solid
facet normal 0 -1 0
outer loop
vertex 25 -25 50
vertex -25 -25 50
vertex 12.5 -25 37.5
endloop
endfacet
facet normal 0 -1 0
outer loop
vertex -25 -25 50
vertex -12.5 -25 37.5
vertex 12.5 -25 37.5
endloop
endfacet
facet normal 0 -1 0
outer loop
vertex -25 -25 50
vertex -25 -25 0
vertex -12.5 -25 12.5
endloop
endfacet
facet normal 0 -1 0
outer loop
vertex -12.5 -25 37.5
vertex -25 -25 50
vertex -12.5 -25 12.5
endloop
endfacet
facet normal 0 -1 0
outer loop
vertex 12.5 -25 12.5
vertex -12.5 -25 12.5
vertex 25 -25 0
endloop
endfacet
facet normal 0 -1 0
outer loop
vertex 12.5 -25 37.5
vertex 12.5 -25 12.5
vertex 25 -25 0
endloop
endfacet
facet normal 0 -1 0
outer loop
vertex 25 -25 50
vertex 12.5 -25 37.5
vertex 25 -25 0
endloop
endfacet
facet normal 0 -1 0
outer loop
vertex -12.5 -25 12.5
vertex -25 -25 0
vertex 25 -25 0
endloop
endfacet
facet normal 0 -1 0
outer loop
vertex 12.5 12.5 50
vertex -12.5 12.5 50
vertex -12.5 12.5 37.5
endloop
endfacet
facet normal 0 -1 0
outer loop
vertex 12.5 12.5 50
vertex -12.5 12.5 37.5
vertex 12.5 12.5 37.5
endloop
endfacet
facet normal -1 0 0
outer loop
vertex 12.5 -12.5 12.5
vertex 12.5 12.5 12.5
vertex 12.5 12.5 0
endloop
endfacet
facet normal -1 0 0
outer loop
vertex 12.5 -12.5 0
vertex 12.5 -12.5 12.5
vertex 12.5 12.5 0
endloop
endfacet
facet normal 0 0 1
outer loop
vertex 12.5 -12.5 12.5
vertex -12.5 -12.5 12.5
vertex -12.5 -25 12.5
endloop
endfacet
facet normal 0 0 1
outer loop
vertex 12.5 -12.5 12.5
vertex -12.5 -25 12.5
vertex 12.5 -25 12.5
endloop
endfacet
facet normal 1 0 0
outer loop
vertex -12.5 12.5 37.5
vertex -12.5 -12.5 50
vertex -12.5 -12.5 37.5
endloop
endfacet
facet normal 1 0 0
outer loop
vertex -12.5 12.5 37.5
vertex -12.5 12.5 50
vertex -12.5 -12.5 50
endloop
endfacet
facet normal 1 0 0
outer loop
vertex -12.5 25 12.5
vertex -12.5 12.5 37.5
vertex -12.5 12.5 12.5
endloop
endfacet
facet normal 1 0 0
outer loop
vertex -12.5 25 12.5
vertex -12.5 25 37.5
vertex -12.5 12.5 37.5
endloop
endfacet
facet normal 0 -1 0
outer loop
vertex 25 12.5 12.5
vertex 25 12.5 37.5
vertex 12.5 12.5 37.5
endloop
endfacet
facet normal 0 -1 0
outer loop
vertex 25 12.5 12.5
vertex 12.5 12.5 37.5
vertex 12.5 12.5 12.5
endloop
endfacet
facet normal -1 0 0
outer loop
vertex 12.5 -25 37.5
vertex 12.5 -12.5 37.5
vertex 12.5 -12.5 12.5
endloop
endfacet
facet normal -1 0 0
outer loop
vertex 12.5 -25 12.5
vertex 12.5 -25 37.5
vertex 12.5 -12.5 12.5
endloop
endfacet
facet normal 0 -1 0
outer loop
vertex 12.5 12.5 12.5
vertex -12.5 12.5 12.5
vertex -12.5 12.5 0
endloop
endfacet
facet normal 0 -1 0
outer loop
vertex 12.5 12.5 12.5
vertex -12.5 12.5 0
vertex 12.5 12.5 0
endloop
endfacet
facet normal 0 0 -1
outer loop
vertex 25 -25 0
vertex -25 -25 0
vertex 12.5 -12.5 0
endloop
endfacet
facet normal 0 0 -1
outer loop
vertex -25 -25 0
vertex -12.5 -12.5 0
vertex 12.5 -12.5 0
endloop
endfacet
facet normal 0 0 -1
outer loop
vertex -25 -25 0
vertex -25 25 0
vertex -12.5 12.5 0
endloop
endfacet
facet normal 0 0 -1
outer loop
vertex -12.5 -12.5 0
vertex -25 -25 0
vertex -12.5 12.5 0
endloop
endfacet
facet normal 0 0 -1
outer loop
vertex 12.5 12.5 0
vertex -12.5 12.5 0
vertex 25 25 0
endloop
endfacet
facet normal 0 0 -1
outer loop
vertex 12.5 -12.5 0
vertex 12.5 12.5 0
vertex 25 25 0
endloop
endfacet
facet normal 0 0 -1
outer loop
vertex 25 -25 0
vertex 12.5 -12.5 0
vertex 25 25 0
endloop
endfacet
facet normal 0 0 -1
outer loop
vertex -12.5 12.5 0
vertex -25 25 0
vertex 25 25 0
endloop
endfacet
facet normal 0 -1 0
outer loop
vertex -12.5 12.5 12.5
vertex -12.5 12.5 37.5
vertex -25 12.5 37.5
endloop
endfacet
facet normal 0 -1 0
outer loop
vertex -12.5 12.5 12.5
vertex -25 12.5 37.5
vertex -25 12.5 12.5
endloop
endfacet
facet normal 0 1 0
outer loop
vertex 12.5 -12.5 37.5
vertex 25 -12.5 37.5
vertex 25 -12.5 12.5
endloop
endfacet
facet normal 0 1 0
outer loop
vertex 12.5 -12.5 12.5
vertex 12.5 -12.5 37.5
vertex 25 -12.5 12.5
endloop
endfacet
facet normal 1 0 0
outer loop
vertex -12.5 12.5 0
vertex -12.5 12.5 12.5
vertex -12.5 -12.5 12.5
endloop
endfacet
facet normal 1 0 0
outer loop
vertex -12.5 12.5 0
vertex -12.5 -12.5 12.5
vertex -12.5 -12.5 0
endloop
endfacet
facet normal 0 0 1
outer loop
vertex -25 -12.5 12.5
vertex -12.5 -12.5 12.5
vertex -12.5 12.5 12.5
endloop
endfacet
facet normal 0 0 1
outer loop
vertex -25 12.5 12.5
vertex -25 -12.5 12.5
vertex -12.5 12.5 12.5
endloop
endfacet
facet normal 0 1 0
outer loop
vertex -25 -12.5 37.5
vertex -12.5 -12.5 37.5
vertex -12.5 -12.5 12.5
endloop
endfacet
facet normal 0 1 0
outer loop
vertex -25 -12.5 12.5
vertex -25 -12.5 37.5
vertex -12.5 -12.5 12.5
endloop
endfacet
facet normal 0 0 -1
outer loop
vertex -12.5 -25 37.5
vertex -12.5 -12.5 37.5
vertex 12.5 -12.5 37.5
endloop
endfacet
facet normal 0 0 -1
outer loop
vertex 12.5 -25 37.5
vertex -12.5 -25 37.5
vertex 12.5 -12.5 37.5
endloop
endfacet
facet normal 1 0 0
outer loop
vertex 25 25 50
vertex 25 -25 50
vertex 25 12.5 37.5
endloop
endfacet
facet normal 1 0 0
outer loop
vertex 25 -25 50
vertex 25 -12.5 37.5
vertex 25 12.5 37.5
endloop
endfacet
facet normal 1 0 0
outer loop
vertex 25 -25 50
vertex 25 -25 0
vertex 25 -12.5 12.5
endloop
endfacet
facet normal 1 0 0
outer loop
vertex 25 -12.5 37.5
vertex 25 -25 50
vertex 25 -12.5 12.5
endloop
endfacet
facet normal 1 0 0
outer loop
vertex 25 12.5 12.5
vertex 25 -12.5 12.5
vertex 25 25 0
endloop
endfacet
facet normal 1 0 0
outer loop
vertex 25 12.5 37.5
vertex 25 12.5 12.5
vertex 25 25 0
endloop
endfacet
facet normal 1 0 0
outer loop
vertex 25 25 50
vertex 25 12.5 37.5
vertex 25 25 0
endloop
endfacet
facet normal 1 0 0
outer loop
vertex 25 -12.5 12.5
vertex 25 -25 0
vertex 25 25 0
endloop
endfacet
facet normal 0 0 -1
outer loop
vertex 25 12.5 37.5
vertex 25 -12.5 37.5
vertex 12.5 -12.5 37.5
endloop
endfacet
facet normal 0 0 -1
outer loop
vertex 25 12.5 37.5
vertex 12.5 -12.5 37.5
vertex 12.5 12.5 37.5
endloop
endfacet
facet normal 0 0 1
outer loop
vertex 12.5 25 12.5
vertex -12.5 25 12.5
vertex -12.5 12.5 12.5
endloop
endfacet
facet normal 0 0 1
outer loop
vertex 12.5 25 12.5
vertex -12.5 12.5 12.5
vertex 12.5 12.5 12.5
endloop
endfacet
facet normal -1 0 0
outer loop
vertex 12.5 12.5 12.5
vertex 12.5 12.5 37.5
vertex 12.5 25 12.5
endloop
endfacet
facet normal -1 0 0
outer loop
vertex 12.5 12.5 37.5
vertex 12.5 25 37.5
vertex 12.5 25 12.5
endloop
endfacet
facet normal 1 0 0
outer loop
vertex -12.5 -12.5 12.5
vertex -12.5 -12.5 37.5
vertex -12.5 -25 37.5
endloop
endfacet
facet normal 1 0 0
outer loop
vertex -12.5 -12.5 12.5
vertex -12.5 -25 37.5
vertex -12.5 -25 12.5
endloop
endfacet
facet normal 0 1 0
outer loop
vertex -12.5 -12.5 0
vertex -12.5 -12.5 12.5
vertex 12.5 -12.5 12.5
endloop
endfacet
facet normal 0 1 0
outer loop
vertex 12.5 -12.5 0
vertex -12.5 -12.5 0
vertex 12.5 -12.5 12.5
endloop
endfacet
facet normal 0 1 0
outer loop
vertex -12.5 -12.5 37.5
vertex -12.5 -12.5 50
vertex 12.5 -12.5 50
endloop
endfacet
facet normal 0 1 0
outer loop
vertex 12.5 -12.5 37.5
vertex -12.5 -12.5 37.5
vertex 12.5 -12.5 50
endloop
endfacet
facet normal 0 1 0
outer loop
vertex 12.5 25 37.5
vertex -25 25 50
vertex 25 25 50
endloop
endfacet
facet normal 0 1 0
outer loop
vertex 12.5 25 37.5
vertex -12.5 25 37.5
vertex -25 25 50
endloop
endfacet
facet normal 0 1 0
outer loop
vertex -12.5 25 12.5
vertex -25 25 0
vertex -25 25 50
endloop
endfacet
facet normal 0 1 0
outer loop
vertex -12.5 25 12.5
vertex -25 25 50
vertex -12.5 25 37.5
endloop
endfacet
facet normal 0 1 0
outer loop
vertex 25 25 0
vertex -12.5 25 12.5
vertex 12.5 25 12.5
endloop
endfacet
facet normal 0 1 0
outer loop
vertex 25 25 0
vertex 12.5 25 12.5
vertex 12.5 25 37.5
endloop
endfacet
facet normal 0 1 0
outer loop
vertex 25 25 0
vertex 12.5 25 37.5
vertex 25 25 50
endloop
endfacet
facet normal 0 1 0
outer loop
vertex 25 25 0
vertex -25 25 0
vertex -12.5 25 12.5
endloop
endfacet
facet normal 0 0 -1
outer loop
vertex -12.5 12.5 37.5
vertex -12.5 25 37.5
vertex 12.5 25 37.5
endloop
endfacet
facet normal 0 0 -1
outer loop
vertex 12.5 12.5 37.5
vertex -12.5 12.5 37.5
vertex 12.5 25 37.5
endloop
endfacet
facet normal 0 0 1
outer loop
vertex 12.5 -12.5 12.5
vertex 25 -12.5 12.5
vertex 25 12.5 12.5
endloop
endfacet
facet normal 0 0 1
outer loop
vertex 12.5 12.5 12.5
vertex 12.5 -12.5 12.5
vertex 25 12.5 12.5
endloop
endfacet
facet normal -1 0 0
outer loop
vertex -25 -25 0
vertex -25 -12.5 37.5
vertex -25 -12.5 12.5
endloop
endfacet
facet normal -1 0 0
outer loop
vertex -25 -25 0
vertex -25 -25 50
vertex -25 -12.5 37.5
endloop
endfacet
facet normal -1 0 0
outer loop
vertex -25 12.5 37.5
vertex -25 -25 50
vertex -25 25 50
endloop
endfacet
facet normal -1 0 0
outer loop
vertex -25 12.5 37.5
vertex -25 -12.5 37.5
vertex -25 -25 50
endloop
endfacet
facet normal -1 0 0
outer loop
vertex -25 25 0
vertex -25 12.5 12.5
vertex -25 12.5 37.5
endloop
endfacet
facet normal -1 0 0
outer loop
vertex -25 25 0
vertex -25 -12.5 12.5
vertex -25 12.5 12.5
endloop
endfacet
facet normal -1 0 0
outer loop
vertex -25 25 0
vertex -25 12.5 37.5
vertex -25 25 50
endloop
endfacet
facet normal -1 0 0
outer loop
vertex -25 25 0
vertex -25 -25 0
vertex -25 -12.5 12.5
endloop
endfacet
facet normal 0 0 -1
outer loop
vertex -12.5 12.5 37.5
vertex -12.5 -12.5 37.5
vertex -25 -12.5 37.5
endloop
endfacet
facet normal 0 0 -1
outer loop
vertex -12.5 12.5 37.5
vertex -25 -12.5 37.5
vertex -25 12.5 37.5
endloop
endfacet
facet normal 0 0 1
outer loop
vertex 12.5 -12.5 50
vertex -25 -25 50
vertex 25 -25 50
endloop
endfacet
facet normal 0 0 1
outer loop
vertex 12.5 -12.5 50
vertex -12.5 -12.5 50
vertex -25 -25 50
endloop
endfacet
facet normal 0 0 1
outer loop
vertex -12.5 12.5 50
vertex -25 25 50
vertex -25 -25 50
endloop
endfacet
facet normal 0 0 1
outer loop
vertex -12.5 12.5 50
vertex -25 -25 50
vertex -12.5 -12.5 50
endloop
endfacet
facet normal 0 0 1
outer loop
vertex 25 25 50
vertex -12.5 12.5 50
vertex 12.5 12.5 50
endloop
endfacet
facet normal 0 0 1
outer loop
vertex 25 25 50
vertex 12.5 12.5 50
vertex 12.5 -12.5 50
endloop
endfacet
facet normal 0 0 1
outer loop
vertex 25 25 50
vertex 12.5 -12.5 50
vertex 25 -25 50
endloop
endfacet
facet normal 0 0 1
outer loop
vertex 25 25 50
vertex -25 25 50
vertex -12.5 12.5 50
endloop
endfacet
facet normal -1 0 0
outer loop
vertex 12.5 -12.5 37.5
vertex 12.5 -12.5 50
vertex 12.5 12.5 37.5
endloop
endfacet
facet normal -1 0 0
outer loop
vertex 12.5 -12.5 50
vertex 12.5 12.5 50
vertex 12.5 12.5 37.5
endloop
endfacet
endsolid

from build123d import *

# Parameters (mm, degrees)
SKETCH2_W           = 50
SKETCH2_H           = 50
BOSS_EXTRUDE1_DEPTH = 50
SKETCH3_W           = 25
SKETCH3_H           = 25
CUT_EXTRUDE1_DEPTH  = 76
SKETCH4_W           = 25
SKETCH4_H           = 25
CUT_EXTRUDE2_DEPTH  = 62.23724357
SKETCH5_W           = 25
SKETCH5_H           = 25
CUT_EXTRUDE3_DEPTH  = 76


with BuildPart() as part:
    # Sketch2 → Boss-Extrude1 (new body)
    with BuildSketch(Plane.XY):
        Rectangle(SKETCH2_W, SKETCH2_H)
    extrude(amount=BOSS_EXTRUDE1_DEPTH)

    # Sketch3 → Cut-Extrude1 (cut, through all)
    with BuildSketch(Plane(origin=(0, 25, 0), x_dir=(1, 0, 0), z_dir=(0, 1, 0))):
        with Locations((0, -25)):
            Rectangle(SKETCH3_W, SKETCH3_H)
    extrude(amount=-CUT_EXTRUDE1_DEPTH, mode=Mode.SUBTRACT)

    # Sketch4 → Cut-Extrude2 (cut, through all)
    with BuildSketch(Plane.XY.offset(50)):
        Rectangle(SKETCH4_W, SKETCH4_H)
    extrude(amount=-CUT_EXTRUDE2_DEPTH, mode=Mode.SUBTRACT)

    # Sketch5 → Cut-Extrude3 (cut, through all)
    with BuildSketch(Plane(origin=(25, 0, 0), x_dir=(0, 0, -1), z_dir=(1, 0, 0))):
        with Locations((-25, 0)):
            Rectangle(SKETCH5_W, SKETCH5_H)
    extrude(amount=-CUT_EXTRUDE3_DEPTH, mode=Mode.SUBTRACT)


solid = part.part
